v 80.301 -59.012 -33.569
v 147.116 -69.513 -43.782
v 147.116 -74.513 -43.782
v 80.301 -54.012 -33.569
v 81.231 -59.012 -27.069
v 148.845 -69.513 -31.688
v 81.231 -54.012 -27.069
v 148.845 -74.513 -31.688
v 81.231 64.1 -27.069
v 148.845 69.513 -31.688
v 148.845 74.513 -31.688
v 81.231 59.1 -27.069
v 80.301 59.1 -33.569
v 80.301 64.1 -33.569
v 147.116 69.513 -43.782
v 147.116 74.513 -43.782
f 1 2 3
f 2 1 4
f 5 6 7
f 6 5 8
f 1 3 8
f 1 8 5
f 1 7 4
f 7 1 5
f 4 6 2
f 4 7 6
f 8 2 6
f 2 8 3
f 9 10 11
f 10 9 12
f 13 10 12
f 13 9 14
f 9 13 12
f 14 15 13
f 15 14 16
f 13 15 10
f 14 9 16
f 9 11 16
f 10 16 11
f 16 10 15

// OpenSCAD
    polyhedron( points = [
            [153.898,59.513,-32.4658] ,
            [163.267,30.683,-34.429] ,
            [175.611,59.513,-24.8805] ,
            [184.981,30.683,-26.8437] ,
            [166.57,-1.77636e-15,-35.1211] ,
            [188.284,-1.77636e-15,-27.5359] ,
            [163.267,-30.683,-34.429] ,
            [184.981,-30.683,-26.8437] ,
            [153.898,-59.513,-32.4658] ,
            [175.611,-59.513,-24.8805] ,
            [181.898,59.513,-27.7158] ,
            [191.267,30.683,-29.679] ,
            [194.57,-1.77636e-15,-30.3711] ,
            [191.267,-30.683,-29.679] ,
            [181.898,-59.513,-27.7158] ,
            [163.961,59.513,-33.9819] ,
            [173.33,30.683,-35.9451] ,
            [176.633,-1.77636e-15,-36.6372] ,
            [173.33,-30.683,-35.9451] ,
            [163.961,-59.513,-33.9819] ,
            [148.845,69.513,-31.6884] ,
            [148.845,-69.513,-31.6884] ,
            [148.845,74.513,-31.6884] ,
            [148.845,-74.513,-31.6884] ,
            [162.25,59.513,-45.946] ,
            [162.25,-59.513,-45.946] ,
            [147.116,-74.513,-43.7824] ,
            [147.116,74.513,-43.7824] ,
            [80.3015,-54.0118,-33.5692] ,
            [147.116,-69.513,-43.7824] ,
            [80.3015,-59.0118,-33.5692] ,
            [81.2307,-54.0118,-27.0692] ,
            [81.2307,-59.0118,-27.0692] ,
            [2.52448,-36,-22.6917] ,
            [80.054,-54.0118,-33.5338] ,
            [80.054,-59.0118,-33.5338] ,
            [2.52448,-41,-22.6917] ,
            [80.9832,-59.0118,-27.0338] ,
            [80.9832,-54.0118,-27.0338] ,
            [2.666,-36,-21.7018] ,
            [2.666,-41,-21.7018] ,
            [147.116,69.513,-43.7824] ,
            [80.3015,59.0998,-33.5692] ,
            [80.3015,64.0998,-33.5692] ,
            [81.2307,59.0998,-27.0692] ,
            [81.2307,64.0998,-27.0692] ,
            [80.054,64.0998,-33.5338] ,
            [80.054,59.0998,-33.5338] ,
            [2.52448,47,-22.6917] ,
            [2.52448,52,-22.6917] ,
            [2.666,47,-21.7018] ,
            [80.9832,59.0998,-27.0338] ,
            [80.9832,64.0998,-27.0338] ,
            [2.666,52,-21.7018] ,
        ],
        faces = [
            [2,1,0] ,
            [3,1,2] ,
            [3,4,1] ,
            [5,4,3] ,
            [5,6,4] ,
            [7,6,5] ,
            [7,8,6] ,
            [9,8,7] ,
            [10,3,2] ,
            [11,3,10] ,
            [11,5,3] ,
            [12,5,11] ,
            [12,7,5] ,
            [13,7,12] ,
            [13,9,7] ,
            [14,9,13] ,
            [15,11,10] ,
            [16,11,15] ,
            [16,12,11] ,
            [17,12,16] ,
            [17,13,12] ,
            [18,13,17] ,
            [18,14,13] ,
            [19,14,18] ,
            [20,0,1] ,
            [20,1,4] ,
            [20,4,21] ,
            [21,4,6] ,
            [21,6,8] ,
            [0,20,22] ,
            [23,21,8] ,
            [16,15,24] ,
            [17,16,24] ,
            [25,17,24] ,
            [18,17,25] ,
            [19,18,25] ,
            [26,25,24] ,
            [26,23,25] ,
            [23,19,25] ,
            [27,26,24] ,
            [24,15,22] ,
            [24,22,27] ,
            [23,27,22] ,
            [23,26,27] ,
            [0,15,10] ,
            [10,2,0] ,
            [22,15,0] ,
            [14,19,8] ,
            [8,9,14] ,
            [8,19,23] ,
        ]);
    polyhedron( points = [
            [0,0,0],
            [148.845,-69.513,-31.6884] ,
            [0,0,0],
            [148.845,-74.513,-31.6884] ,
            [0,0,0],
            [0,0,0],
            [147.116,-74.513,-43.7824] ,
            [0,0,0],
            [80.3015,-54.0118,-33.5692] ,
            [147.116,-69.513,-43.7824] ,
            [80.3015,-59.0118,-33.5692] ,
            [81.2307,-54.0118,-27.0692] ,
            [81.2307,-59.0118,-27.0692] ,
            [0,0,0],
            [0,0,0],
            [0,0,0],
            [0,0,0],
            [0,0,0],
            [0,0,0],
            [0,0,0],
            [0,0,0],

            [147.116,69.513,-43.7824] ,
            [80.3015,59.0998,-33.5692] ,
            [80.3015,64.0998,-33.5692] ,
            [81.2307,59.0998,-27.0692] ,
            [81.2307,64.0998,-27.0692] ,
            [0,0,0],
            [0,0,0],
            [0,0,0],
            [0,0,0],
            [0,0,0],
            [0,0,0],
            [0,0,0],
            [0,0,0],
            [148.845,69.513,-31.6884] ,
            [148.845,74.513,-31.6884] ,
            [147.116,74.513,-43.7824] ,
        ],
        faces = [
            [6,9,8] ,
            [6,8,10] ,
            [11,1,3] ,
            [12,11,3] ,
            [3,6,10] ,
            [3,10,12] ,
            [8,12,10] ,
            [8,9,1] ,
            [11,8,1] ,
            [8,11,12] ,
            [6,3,9] ,
            [9,3,1] ,

            [35,34,24] ,
            [35,24,25] ,
            [34,22,24] ,
            [25,24,22] ,
            [23,25,22] ,
            [22,21,36] ,
            [23,22,36] ,
            [34,21,22] ,
            [23,36,25] ,
            [25,36,35] ,
            [21,35,36] ,
            [34,35,21] ,
        ]);
